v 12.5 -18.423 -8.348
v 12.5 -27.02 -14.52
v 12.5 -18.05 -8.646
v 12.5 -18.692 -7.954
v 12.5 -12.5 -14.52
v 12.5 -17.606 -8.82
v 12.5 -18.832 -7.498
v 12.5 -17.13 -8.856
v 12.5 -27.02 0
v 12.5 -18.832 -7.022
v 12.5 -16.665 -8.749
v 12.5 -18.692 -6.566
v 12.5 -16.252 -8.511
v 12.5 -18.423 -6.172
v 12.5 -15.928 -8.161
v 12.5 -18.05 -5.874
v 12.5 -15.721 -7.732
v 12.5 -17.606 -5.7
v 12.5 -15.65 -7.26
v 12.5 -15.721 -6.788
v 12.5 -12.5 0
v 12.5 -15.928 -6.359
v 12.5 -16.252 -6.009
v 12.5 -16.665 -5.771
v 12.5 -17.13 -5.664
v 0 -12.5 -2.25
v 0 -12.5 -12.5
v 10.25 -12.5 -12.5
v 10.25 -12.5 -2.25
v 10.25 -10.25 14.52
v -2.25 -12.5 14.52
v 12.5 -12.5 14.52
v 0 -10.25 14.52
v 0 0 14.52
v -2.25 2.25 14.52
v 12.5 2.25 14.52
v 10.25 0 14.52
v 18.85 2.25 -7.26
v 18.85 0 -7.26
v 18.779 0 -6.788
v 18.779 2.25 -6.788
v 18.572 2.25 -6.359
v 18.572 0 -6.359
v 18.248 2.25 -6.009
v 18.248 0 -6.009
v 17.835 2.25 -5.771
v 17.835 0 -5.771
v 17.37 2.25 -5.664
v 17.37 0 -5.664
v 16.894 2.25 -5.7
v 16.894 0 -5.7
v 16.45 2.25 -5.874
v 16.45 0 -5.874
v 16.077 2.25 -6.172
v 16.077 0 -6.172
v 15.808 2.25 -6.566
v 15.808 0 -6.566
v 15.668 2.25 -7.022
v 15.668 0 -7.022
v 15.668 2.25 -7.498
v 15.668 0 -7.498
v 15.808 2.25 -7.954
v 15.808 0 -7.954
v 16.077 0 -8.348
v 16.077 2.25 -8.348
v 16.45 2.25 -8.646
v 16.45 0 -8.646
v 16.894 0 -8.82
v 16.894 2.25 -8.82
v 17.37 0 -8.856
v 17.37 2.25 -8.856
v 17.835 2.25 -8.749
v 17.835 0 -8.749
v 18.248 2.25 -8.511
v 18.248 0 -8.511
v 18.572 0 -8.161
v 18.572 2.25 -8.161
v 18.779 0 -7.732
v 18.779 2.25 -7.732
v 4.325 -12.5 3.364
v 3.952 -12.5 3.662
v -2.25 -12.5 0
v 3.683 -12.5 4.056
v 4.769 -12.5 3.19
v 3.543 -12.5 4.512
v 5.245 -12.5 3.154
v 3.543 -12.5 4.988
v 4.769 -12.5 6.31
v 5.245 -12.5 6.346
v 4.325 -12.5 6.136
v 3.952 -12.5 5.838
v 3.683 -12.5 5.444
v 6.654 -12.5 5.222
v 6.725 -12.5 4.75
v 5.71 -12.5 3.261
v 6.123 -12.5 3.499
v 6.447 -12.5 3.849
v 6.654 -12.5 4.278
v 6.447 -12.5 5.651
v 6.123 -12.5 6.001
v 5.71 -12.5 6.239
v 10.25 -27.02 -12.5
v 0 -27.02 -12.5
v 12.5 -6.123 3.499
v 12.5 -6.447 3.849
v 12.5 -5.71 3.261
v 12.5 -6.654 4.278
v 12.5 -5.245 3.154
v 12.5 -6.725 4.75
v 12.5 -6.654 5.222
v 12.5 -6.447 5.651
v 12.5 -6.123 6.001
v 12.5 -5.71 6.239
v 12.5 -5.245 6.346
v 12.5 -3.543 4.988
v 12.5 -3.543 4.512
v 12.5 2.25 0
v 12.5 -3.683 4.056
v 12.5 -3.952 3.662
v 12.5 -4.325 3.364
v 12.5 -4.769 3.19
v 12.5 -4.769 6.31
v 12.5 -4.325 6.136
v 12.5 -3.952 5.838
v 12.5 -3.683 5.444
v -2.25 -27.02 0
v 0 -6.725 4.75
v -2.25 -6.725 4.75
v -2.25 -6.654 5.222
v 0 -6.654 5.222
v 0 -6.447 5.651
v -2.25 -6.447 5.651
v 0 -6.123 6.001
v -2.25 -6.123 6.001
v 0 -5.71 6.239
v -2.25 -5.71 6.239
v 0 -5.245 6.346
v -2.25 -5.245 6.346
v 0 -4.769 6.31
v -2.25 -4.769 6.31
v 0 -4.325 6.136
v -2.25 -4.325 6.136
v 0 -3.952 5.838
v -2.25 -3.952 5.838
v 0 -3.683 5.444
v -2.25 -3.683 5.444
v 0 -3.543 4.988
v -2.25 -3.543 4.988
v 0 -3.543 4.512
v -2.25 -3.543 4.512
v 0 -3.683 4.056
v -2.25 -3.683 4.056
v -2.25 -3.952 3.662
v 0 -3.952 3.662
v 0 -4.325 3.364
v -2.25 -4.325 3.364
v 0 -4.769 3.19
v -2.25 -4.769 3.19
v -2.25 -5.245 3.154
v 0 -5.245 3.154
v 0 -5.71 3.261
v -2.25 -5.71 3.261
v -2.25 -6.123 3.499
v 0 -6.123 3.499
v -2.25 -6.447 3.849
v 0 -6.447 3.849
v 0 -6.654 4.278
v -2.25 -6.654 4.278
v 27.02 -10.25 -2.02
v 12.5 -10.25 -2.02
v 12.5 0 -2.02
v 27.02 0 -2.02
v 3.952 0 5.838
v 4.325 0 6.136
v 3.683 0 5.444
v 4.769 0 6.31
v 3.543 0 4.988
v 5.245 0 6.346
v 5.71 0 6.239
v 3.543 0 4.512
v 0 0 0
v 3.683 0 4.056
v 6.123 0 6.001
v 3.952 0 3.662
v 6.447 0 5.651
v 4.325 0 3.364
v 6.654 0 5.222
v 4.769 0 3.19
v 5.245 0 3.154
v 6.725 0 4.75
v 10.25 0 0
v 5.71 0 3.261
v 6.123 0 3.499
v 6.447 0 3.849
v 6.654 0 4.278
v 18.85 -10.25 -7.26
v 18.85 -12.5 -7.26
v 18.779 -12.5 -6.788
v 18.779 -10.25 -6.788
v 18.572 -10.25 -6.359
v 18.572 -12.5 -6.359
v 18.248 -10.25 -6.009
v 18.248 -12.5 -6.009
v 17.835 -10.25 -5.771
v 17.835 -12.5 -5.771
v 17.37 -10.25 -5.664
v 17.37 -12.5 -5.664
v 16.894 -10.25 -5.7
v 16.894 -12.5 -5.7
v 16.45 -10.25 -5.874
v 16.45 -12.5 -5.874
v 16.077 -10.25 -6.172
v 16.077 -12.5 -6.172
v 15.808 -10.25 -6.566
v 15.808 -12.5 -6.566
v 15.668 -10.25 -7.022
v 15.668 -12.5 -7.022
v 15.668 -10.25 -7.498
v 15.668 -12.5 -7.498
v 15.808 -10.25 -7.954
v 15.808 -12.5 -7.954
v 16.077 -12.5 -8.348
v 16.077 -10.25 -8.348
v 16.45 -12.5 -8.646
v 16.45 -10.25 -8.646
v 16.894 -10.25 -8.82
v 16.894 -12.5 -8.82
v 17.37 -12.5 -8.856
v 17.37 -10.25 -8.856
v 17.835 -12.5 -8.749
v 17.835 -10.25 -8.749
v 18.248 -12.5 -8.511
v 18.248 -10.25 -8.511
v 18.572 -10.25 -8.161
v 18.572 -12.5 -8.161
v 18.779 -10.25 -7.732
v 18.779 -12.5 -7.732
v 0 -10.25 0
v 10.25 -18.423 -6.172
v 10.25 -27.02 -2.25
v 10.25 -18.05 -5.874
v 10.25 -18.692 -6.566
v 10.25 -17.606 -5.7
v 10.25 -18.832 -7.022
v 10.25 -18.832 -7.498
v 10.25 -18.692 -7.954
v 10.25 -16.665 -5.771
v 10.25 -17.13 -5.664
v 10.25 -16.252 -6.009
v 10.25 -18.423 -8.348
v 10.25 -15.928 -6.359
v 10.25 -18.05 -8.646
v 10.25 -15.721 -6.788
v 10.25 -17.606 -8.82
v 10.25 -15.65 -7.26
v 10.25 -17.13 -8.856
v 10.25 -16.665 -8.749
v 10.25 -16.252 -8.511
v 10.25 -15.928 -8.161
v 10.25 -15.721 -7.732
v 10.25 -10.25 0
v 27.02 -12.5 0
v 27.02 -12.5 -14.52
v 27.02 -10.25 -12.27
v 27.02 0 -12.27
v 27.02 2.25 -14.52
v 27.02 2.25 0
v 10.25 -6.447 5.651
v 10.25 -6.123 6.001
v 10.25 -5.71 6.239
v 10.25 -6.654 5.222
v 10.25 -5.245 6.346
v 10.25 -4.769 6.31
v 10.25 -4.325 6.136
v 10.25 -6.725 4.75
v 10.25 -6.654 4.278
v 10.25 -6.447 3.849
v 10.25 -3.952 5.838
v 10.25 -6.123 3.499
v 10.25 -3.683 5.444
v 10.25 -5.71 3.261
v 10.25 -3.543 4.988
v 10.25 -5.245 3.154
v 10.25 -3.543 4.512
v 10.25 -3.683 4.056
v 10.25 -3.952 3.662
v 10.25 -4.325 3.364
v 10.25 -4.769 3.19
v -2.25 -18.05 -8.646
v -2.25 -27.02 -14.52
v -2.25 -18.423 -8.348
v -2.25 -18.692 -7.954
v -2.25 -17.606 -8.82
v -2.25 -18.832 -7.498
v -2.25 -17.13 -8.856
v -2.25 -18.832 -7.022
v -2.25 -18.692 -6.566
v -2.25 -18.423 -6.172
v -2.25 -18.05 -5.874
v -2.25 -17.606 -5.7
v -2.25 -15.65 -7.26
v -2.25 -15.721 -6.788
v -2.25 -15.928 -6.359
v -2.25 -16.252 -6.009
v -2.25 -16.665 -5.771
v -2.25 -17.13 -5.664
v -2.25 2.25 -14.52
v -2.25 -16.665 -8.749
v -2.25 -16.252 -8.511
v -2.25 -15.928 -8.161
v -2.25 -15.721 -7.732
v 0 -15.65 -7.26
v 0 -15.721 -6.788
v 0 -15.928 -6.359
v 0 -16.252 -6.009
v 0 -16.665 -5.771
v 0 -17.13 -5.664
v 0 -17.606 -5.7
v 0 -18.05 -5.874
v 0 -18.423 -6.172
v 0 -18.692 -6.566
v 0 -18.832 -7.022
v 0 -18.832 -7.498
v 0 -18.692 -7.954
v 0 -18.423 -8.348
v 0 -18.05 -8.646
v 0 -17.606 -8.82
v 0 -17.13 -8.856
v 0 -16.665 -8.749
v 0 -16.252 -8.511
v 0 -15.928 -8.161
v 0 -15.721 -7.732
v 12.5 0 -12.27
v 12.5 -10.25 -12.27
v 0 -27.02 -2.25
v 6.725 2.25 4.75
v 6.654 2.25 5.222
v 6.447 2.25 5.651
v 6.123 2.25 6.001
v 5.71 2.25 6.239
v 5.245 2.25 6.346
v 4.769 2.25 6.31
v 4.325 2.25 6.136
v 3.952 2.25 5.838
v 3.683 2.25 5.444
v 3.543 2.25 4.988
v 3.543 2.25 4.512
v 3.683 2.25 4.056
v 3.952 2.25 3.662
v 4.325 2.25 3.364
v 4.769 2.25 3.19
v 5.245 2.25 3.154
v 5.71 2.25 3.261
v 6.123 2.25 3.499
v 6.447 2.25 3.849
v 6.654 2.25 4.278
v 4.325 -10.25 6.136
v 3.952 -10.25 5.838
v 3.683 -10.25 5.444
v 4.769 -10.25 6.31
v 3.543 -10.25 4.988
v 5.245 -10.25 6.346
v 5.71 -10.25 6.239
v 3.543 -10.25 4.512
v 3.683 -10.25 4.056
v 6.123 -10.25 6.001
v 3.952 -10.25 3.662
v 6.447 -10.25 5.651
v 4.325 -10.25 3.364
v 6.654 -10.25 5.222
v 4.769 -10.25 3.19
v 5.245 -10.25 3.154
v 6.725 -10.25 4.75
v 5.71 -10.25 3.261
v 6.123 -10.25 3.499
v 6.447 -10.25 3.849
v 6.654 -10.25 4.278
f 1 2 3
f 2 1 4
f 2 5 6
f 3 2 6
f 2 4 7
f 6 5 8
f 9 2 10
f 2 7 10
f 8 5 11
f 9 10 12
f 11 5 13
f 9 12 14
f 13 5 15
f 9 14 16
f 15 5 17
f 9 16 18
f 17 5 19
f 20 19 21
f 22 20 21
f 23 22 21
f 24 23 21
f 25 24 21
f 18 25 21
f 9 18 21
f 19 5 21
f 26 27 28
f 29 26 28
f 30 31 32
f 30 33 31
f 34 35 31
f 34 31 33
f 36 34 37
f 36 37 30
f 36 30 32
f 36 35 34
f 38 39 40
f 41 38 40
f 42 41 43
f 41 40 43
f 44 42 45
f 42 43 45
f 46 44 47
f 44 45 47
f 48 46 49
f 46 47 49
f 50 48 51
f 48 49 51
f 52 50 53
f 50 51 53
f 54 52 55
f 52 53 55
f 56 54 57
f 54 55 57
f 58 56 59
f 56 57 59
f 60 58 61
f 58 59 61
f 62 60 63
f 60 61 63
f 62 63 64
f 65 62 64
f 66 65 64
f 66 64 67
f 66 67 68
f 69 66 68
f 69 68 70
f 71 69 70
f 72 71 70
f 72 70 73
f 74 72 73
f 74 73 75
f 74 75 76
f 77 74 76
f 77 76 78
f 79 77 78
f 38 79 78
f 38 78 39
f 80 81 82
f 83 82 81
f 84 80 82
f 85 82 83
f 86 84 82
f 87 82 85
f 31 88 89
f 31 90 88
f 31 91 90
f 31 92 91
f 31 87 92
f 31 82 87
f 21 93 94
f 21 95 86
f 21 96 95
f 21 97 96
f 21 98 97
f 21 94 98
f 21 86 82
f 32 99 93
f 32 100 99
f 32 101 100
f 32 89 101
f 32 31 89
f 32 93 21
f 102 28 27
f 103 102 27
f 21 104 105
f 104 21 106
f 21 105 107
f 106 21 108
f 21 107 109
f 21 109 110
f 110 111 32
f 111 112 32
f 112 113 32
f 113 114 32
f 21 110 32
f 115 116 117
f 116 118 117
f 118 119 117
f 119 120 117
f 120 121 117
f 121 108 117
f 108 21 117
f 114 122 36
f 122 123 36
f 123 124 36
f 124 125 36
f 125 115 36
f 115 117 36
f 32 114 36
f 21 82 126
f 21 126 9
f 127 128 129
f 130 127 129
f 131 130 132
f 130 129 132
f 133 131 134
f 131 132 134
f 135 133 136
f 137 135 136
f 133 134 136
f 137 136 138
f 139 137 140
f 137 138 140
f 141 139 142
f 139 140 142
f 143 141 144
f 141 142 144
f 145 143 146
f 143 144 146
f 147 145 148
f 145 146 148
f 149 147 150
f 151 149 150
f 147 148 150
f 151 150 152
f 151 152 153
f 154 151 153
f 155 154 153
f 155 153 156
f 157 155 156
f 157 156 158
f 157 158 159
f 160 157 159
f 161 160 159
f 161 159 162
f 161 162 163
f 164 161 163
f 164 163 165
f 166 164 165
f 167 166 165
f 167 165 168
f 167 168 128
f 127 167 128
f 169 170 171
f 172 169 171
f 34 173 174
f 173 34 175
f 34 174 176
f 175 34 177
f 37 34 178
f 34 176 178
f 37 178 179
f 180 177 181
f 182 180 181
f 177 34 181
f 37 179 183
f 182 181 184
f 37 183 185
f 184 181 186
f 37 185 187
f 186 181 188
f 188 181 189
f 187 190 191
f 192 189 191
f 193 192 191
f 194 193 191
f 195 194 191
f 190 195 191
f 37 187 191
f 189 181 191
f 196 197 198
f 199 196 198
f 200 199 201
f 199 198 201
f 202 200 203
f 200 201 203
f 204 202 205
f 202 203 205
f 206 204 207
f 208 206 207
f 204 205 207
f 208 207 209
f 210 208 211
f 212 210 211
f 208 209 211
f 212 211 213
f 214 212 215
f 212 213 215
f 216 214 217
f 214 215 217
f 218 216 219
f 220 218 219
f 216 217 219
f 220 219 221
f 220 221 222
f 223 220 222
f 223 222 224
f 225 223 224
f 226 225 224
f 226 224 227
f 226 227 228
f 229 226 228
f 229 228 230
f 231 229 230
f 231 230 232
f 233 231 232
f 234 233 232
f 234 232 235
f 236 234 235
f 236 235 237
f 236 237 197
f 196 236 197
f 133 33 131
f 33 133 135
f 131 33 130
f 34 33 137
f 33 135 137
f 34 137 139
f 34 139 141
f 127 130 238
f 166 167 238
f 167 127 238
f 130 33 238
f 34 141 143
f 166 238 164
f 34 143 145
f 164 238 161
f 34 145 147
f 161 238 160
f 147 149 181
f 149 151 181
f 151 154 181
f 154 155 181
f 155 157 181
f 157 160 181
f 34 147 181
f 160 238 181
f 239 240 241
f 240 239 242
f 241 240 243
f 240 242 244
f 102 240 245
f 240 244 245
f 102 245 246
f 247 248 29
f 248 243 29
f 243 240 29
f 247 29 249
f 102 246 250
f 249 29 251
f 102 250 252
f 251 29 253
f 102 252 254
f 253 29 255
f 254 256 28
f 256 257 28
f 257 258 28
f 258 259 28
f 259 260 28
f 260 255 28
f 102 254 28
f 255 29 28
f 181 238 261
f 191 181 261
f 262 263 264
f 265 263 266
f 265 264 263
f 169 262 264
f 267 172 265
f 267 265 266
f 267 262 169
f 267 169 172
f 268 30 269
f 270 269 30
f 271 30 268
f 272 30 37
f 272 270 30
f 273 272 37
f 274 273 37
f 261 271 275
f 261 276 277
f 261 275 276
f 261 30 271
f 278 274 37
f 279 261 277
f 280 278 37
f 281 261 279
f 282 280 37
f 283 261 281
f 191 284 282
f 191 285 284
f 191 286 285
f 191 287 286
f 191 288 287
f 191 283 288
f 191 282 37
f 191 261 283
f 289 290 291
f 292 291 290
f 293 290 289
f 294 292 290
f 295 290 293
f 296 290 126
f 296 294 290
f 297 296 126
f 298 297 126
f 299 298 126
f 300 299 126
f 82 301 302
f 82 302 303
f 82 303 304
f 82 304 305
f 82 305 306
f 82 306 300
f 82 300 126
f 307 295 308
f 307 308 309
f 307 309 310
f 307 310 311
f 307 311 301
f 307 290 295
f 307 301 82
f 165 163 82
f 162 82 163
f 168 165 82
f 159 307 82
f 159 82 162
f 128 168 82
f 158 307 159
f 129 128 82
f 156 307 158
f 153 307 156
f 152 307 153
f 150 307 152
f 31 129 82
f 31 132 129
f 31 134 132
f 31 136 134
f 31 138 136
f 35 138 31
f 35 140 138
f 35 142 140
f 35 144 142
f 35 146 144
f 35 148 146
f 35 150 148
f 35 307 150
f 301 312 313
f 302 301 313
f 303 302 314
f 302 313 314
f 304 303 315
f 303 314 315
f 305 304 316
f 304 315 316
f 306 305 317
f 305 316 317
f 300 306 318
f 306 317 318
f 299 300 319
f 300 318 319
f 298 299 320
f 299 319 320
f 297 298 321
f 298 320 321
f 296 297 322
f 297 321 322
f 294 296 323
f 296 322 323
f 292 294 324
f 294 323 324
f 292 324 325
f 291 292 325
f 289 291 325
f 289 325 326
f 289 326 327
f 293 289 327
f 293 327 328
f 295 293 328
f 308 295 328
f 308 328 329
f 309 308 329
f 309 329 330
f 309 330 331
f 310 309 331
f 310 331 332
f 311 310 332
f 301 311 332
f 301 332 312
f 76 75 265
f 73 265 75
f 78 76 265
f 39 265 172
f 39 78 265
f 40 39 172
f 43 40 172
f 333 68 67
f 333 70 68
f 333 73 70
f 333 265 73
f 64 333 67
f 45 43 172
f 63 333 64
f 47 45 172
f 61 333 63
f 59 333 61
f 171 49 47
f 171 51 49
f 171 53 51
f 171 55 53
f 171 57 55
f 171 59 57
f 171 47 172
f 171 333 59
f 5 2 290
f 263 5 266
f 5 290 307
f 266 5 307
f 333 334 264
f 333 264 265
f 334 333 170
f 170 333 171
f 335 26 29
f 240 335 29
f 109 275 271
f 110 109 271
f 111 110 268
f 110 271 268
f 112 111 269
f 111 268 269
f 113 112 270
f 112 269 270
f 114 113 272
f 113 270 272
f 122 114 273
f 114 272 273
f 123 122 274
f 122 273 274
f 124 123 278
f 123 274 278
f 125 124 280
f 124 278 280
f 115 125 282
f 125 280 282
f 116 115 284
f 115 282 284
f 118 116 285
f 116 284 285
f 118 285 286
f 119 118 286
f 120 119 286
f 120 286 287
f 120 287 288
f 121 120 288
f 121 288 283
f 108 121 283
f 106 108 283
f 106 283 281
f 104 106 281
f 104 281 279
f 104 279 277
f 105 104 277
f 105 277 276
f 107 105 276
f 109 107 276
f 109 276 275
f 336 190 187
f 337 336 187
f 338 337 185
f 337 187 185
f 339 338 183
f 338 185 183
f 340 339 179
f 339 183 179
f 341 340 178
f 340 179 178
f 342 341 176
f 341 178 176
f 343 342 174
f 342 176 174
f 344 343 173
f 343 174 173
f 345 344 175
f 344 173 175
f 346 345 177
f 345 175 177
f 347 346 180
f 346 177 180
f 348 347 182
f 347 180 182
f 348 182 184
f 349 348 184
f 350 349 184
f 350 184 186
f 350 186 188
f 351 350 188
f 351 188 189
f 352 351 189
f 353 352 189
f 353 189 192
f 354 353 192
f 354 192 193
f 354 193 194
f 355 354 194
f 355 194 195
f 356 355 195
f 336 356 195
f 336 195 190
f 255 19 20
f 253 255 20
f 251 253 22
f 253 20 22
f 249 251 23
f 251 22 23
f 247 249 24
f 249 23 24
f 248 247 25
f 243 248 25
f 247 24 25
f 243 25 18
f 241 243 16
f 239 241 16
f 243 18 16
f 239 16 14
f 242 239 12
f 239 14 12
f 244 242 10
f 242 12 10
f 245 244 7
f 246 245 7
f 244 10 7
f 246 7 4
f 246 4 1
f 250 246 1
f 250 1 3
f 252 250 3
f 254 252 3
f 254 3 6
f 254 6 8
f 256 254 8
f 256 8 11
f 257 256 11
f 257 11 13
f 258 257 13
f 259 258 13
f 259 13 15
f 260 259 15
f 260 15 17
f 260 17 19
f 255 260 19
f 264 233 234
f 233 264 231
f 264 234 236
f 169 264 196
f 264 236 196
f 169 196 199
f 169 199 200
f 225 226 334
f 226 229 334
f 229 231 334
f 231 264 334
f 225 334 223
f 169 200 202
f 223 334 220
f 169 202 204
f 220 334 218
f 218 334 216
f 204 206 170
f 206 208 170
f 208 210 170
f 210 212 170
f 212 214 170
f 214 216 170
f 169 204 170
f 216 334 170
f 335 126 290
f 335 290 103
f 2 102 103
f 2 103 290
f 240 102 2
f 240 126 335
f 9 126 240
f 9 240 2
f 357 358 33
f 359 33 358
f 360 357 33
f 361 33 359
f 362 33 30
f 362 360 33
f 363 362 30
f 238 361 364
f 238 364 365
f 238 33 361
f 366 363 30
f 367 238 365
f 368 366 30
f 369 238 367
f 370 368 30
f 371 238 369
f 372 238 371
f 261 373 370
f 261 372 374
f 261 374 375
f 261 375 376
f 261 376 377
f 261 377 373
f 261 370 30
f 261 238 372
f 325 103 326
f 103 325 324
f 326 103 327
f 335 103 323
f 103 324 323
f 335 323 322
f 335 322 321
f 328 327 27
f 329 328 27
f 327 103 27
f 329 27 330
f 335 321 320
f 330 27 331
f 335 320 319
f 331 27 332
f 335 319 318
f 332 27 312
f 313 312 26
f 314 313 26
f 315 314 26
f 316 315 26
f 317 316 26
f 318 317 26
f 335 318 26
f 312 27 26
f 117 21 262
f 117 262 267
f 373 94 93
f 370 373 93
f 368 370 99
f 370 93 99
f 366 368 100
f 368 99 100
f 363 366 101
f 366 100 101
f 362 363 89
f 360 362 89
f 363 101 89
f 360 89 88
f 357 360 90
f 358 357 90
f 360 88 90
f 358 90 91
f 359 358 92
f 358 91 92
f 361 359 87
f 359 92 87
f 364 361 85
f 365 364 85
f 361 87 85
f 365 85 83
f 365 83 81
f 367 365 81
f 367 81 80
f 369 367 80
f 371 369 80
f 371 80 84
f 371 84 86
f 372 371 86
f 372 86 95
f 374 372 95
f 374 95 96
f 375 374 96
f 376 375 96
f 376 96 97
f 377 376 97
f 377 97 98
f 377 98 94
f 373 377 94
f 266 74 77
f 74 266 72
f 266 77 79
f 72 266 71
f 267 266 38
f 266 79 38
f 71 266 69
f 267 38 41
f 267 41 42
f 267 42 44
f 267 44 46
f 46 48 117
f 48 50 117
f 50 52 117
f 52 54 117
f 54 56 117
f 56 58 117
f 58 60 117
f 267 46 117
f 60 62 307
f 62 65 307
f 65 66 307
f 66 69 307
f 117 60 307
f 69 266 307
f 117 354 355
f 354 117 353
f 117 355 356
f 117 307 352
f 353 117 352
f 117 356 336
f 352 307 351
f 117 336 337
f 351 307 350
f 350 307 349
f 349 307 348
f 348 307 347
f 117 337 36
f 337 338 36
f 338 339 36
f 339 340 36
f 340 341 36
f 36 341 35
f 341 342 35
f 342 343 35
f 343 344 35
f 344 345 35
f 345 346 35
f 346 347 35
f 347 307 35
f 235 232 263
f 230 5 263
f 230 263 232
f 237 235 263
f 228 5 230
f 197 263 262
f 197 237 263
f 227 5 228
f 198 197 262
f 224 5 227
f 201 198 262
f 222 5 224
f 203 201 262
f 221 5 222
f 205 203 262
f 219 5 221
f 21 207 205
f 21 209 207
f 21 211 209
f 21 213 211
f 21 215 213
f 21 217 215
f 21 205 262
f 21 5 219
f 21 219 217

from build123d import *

# Parameters (mm, degrees)
F0_W      = 14.75
F0_H      = 14.75
F0_W_2    = 10.25
F0_H_2    = 10.25
F1_DEPTH  = 14.5200116
F2_W      = 14.75
F2_H      = 14.75
F2_W_2    = 10.25
F2_H_2    = 10.25
F3_DEPTH  = 14.5200116
F4_W      = 14.75
F4_H      = 14.5200116
F5_DEPTH  = 14.5200116
F6_W      = 14.75
F6_H      = 14.5200116
F6_W_2    = 10.25
F6_H_2    = 10.25
F7_DEPTH  = 14.5200116
F8_R      = 1.6
F9_DEPTH  = 25.4
F10_R     = 1.6
F11_DEPTH = 25.4
F12_R     = 1.6
F13_DEPTH = 25.4
F14_R     = 1.6
F15_DEPTH = 25.4


with BuildPart() as f1:
    # F0 (on Top) → F1 (new body)
    with BuildSketch(Plane.XY):
        with Locations((5.125, -5.125)):
            Rectangle(F0_W, F0_H)
        with Locations((5.125, -5.125)):
            Rectangle(F0_W_2, F0_H_2, mode=Mode.SUBTRACT)
    extrude(amount=F1_DEPTH)

    # F2 (on face) → F3 (join)
    with BuildSketch(Plane(origin=(0, 0, 0), x_dir=(1, 0, 0), z_dir=(0, 0, -1))):
        with Locations((5.125, 5.125)):
            Rectangle(F2_W, F2_H)
        with Locations((5.125, 5.125)):
            Rectangle(F2_W_2, F2_H_2, mode=Mode.SUBTRACT)
        with Locations((5.125, 5.125)):
            Rectangle(F2_W_2, F2_H_2)
    extrude(amount=F3_DEPTH)

    # F4 (on face) → F5 (join)
    with BuildSketch(Plane.XZ.offset(12.5)):
        with Locations((5.125, -7.2600058)):
            Rectangle(F4_W, F4_H)
        Polygon((0, -12.2700116), (0, -2.25), (10.25, -2.25), (10.25, -12.2700116), (10.25, -12.5), (0, -12.5), align=None, mode=Mode.SUBTRACT)
    extrude(amount=F5_DEPTH)

    # F6 (on face) → F7 (join)
    with BuildSketch(Plane.YZ.offset(12.5)):
        with Locations((-5.125, -7.2600058)):
            Rectangle(F6_W, F6_H)
        with Locations((-5.125, -7.1450116)):
            Rectangle(F6_W_2, F6_H_2, mode=Mode.SUBTRACT)
    extrude(amount=F7_DEPTH)

    # F8 (on face) → F9 (cut)
    with BuildSketch(Plane.XZ.offset(12.5)):
        with Locations((17.25, -7.2600058)):
            Circle(F8_R)
    extrude(amount=-F9_DEPTH, mode=Mode.SUBTRACT)

    # F10 (on face) → F11 (cut)
    with BuildSketch(Plane.YZ.offset(12.5)):
        with Locations((-17.25, -7.2600058)):
            Circle(F10_R)
    extrude(amount=-F11_DEPTH, mode=Mode.SUBTRACT)

    # F12 (on face) → F13 (cut)
    with BuildSketch(Plane(origin=(-2.25, 0, 0), x_dir=(0, -1, 0), z_dir=(-1, 0, 0))):
        with Locations((5.125, 4.75)):
            Circle(F12_R)
    extrude(amount=-F13_DEPTH, mode=Mode.SUBTRACT)

    # F14 (on face) → F15 (cut)
    with BuildSketch(Plane.XZ.offset(12.5)):
        with Locations((5.125, 4.75)):
            Circle(F14_R)
    extrude(amount=-F15_DEPTH, mode=Mode.SUBTRACT)


solid = f1.part
